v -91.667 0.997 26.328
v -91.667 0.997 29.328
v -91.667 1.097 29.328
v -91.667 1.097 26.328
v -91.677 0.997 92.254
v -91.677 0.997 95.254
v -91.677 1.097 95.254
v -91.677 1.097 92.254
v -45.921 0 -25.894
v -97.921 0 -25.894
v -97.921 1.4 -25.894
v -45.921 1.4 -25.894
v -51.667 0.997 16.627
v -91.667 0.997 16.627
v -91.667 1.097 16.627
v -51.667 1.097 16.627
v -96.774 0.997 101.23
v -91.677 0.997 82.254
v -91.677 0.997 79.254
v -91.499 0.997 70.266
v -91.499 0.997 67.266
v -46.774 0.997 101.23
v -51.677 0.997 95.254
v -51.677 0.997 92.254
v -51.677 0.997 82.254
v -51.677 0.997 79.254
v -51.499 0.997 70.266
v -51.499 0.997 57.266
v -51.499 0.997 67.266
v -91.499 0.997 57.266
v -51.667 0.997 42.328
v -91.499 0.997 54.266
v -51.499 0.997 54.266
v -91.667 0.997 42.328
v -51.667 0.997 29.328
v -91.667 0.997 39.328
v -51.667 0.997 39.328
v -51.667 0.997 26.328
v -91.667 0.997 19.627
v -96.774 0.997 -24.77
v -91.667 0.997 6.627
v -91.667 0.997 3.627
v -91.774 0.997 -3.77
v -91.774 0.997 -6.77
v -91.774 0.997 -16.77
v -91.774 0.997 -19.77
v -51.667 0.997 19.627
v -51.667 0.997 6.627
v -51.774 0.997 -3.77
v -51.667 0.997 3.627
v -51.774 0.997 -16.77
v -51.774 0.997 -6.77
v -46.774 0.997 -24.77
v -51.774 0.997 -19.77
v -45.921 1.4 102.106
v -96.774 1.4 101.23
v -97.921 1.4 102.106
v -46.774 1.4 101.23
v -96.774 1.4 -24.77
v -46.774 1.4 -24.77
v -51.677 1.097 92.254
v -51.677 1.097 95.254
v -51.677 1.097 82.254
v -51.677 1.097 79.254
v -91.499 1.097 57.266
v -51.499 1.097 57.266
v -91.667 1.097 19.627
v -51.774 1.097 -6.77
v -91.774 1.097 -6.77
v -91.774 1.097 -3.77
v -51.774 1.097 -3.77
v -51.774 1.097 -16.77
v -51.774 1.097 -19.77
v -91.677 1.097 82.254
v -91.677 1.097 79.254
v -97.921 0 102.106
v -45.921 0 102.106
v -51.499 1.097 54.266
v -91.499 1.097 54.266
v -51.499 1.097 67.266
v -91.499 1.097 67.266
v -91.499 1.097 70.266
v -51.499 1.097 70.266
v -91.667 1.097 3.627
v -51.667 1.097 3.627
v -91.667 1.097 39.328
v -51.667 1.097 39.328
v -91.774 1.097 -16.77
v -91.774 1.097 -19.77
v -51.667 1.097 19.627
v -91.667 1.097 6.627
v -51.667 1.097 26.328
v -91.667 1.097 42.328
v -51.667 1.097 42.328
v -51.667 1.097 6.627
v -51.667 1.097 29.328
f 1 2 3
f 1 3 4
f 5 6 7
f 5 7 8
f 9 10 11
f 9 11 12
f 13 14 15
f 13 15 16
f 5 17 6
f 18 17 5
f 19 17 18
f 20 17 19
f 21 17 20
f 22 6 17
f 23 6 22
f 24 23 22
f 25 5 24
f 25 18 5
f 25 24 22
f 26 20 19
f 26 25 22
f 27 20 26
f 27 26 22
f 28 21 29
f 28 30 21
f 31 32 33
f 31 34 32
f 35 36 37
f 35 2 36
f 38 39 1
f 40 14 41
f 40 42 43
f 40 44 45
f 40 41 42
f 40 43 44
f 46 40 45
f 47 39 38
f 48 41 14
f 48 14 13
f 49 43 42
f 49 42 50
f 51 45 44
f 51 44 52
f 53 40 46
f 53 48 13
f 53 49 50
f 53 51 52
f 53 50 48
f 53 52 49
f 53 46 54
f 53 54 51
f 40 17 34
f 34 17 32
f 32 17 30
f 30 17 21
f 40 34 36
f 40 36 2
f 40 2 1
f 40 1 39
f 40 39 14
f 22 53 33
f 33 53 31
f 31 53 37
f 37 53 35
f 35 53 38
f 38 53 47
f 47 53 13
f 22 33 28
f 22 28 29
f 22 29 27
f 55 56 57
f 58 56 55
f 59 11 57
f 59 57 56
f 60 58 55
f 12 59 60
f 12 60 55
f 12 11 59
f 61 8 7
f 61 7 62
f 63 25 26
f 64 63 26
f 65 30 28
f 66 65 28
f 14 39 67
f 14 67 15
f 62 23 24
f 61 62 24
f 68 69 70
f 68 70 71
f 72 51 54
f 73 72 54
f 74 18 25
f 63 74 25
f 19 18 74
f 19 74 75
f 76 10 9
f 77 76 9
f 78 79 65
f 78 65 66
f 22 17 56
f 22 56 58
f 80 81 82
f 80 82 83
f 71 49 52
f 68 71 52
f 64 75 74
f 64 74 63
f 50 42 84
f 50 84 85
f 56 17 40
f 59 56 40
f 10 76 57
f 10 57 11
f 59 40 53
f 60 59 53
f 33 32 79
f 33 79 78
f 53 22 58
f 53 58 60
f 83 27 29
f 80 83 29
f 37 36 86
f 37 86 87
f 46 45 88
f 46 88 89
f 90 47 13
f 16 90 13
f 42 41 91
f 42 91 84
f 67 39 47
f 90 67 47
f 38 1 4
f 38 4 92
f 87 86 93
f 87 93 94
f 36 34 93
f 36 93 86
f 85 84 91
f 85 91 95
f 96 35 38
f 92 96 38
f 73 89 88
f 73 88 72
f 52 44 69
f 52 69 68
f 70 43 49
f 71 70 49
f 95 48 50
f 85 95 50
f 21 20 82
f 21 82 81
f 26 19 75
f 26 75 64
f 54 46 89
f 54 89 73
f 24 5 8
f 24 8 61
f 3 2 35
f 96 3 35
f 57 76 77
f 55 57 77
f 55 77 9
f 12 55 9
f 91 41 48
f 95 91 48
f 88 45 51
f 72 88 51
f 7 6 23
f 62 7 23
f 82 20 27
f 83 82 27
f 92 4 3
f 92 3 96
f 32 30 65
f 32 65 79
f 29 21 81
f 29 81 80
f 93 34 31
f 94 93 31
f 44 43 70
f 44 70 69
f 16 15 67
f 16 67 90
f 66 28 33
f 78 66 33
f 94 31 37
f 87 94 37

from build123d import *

# Parameters (mm, degrees)
SKETCH1_W            = 50
SKETCH1_H            = 126
BOSS_EXTRUDE1_DEPTH  = 0.99736772
SKETCH2_W            = 40
SKETCH2_H            = 3
BOSS_EXTRUDE2_DEPTH  = 0.1
SKETCH6_W            = 52
SKETCH6_H            = 128
SKETCH6_W_2          = 50
SKETCH6_H_2          = 126
BOSS_EXTRUDE8_DEPTH  = 1.4
SKETCH11_W           = 40
SKETCH11_H           = 3
BOSS_EXTRUDE12_DEPTH = 0.1
SKETCH12_W           = 40
SKETCH12_H           = 3
BOSS_EXTRUDE13_DEPTH = 0.1
SKETCH13_W           = 40
SKETCH13_H           = 3
BOSS_EXTRUDE14_DEPTH = 0.1
SKETCH14_W           = 40
SKETCH14_H           = 3
BOSS_EXTRUDE15_DEPTH = 0.1


with BuildPart() as part:
    # Sketch1 → Boss-Extrude1 (new body)
    with BuildSketch(Plane(origin=(0, 0, 0), x_dir=(1, 0, 0), z_dir=(0, 1, 0))):
        with Locations((-71.774193548, -38.230414747)):
            Rectangle(SKETCH1_W, SKETCH1_H)
    extrude(amount=BOSS_EXTRUDE1_DEPTH)

    # Sketch2 → Boss-Extrude2 (add)
    with BuildSketch(Plane(origin=(0, 0.99736772, 0), x_dir=(1, 0, 0), z_dir=(0, 1, 0))):
        with Locations((-71.774193548, 18.269585253)):
            Rectangle(SKETCH2_W, SKETCH2_H)
        with Locations((-71.774193548, 5.269585253)):
            Rectangle(SKETCH2_W, SKETCH2_H)
    extrude(amount=BOSS_EXTRUDE2_DEPTH)

    # Sketch6 → Boss-Extrude8 (add)
    with BuildSketch(Plane(origin=(0, 0, 0), x_dir=(1, 0, 0), z_dir=(0, 1, 0))):
        with Locations((-71.921181358, -38.105868157)):
            Rectangle(SKETCH6_W, SKETCH6_H)
        with Locations((-71.774193548, -38.230414747)):
            Rectangle(SKETCH6_W_2, SKETCH6_H_2, mode=Mode.SUBTRACT)
    extrude(amount=BOSS_EXTRUDE8_DEPTH)

    # Sketch11 → Boss-Extrude12 (add)
    with BuildSketch(Plane(origin=(0, 0.99736772, 0), x_dir=(1, 0, 0), z_dir=(0, 1, 0))):
        with Locations((-71.666893543, -5.127021843)):
            Rectangle(SKETCH11_W, SKETCH11_H)
        with Locations((-71.666893543, -18.127021843)):
            Rectangle(SKETCH11_W, SKETCH11_H)
    extrude(amount=BOSS_EXTRUDE12_DEPTH)

    # Sketch12 → Boss-Extrude13 (add)
    with BuildSketch(Plane(origin=(0, 0.99736772, -2.5), x_dir=(1, 0, 0), z_dir=(0, 1, 0))):
        with Locations((-71.666893543, -30.328159375)):
            Rectangle(SKETCH12_W, SKETCH12_H)
        with Locations((-71.666893543, -43.328159375)):
            Rectangle(SKETCH12_W, SKETCH12_H)
    extrude(amount=BOSS_EXTRUDE13_DEPTH)

    # Sketch13 → Boss-Extrude14 (add)
    with BuildSketch(Plane(origin=(0, 0.99736772, 0), x_dir=(1, 0, 0), z_dir=(0, 1, 0))):
        with Locations((-71.498865442, -55.766480825)):
            Rectangle(SKETCH13_W, SKETCH13_H)
        with Locations((-71.498865442, -68.766480825)):
            Rectangle(SKETCH13_W, SKETCH13_H)
    extrude(amount=BOSS_EXTRUDE14_DEPTH)

    # Sketch14 → Boss-Extrude15 (add)
    with BuildSketch(Plane(origin=(0, 0.99736772, 0), x_dir=(1, 0, 0), z_dir=(0, 1, 0))):
        with Locations((-71.677348389, -80.754093343)):
            Rectangle(SKETCH14_W, SKETCH14_H)
        with Locations((-71.677348389, -93.754093343)):
            Rectangle(SKETCH14_W, SKETCH14_H)
    extrude(amount=BOSS_EXTRUDE15_DEPTH)


solid = part.part
